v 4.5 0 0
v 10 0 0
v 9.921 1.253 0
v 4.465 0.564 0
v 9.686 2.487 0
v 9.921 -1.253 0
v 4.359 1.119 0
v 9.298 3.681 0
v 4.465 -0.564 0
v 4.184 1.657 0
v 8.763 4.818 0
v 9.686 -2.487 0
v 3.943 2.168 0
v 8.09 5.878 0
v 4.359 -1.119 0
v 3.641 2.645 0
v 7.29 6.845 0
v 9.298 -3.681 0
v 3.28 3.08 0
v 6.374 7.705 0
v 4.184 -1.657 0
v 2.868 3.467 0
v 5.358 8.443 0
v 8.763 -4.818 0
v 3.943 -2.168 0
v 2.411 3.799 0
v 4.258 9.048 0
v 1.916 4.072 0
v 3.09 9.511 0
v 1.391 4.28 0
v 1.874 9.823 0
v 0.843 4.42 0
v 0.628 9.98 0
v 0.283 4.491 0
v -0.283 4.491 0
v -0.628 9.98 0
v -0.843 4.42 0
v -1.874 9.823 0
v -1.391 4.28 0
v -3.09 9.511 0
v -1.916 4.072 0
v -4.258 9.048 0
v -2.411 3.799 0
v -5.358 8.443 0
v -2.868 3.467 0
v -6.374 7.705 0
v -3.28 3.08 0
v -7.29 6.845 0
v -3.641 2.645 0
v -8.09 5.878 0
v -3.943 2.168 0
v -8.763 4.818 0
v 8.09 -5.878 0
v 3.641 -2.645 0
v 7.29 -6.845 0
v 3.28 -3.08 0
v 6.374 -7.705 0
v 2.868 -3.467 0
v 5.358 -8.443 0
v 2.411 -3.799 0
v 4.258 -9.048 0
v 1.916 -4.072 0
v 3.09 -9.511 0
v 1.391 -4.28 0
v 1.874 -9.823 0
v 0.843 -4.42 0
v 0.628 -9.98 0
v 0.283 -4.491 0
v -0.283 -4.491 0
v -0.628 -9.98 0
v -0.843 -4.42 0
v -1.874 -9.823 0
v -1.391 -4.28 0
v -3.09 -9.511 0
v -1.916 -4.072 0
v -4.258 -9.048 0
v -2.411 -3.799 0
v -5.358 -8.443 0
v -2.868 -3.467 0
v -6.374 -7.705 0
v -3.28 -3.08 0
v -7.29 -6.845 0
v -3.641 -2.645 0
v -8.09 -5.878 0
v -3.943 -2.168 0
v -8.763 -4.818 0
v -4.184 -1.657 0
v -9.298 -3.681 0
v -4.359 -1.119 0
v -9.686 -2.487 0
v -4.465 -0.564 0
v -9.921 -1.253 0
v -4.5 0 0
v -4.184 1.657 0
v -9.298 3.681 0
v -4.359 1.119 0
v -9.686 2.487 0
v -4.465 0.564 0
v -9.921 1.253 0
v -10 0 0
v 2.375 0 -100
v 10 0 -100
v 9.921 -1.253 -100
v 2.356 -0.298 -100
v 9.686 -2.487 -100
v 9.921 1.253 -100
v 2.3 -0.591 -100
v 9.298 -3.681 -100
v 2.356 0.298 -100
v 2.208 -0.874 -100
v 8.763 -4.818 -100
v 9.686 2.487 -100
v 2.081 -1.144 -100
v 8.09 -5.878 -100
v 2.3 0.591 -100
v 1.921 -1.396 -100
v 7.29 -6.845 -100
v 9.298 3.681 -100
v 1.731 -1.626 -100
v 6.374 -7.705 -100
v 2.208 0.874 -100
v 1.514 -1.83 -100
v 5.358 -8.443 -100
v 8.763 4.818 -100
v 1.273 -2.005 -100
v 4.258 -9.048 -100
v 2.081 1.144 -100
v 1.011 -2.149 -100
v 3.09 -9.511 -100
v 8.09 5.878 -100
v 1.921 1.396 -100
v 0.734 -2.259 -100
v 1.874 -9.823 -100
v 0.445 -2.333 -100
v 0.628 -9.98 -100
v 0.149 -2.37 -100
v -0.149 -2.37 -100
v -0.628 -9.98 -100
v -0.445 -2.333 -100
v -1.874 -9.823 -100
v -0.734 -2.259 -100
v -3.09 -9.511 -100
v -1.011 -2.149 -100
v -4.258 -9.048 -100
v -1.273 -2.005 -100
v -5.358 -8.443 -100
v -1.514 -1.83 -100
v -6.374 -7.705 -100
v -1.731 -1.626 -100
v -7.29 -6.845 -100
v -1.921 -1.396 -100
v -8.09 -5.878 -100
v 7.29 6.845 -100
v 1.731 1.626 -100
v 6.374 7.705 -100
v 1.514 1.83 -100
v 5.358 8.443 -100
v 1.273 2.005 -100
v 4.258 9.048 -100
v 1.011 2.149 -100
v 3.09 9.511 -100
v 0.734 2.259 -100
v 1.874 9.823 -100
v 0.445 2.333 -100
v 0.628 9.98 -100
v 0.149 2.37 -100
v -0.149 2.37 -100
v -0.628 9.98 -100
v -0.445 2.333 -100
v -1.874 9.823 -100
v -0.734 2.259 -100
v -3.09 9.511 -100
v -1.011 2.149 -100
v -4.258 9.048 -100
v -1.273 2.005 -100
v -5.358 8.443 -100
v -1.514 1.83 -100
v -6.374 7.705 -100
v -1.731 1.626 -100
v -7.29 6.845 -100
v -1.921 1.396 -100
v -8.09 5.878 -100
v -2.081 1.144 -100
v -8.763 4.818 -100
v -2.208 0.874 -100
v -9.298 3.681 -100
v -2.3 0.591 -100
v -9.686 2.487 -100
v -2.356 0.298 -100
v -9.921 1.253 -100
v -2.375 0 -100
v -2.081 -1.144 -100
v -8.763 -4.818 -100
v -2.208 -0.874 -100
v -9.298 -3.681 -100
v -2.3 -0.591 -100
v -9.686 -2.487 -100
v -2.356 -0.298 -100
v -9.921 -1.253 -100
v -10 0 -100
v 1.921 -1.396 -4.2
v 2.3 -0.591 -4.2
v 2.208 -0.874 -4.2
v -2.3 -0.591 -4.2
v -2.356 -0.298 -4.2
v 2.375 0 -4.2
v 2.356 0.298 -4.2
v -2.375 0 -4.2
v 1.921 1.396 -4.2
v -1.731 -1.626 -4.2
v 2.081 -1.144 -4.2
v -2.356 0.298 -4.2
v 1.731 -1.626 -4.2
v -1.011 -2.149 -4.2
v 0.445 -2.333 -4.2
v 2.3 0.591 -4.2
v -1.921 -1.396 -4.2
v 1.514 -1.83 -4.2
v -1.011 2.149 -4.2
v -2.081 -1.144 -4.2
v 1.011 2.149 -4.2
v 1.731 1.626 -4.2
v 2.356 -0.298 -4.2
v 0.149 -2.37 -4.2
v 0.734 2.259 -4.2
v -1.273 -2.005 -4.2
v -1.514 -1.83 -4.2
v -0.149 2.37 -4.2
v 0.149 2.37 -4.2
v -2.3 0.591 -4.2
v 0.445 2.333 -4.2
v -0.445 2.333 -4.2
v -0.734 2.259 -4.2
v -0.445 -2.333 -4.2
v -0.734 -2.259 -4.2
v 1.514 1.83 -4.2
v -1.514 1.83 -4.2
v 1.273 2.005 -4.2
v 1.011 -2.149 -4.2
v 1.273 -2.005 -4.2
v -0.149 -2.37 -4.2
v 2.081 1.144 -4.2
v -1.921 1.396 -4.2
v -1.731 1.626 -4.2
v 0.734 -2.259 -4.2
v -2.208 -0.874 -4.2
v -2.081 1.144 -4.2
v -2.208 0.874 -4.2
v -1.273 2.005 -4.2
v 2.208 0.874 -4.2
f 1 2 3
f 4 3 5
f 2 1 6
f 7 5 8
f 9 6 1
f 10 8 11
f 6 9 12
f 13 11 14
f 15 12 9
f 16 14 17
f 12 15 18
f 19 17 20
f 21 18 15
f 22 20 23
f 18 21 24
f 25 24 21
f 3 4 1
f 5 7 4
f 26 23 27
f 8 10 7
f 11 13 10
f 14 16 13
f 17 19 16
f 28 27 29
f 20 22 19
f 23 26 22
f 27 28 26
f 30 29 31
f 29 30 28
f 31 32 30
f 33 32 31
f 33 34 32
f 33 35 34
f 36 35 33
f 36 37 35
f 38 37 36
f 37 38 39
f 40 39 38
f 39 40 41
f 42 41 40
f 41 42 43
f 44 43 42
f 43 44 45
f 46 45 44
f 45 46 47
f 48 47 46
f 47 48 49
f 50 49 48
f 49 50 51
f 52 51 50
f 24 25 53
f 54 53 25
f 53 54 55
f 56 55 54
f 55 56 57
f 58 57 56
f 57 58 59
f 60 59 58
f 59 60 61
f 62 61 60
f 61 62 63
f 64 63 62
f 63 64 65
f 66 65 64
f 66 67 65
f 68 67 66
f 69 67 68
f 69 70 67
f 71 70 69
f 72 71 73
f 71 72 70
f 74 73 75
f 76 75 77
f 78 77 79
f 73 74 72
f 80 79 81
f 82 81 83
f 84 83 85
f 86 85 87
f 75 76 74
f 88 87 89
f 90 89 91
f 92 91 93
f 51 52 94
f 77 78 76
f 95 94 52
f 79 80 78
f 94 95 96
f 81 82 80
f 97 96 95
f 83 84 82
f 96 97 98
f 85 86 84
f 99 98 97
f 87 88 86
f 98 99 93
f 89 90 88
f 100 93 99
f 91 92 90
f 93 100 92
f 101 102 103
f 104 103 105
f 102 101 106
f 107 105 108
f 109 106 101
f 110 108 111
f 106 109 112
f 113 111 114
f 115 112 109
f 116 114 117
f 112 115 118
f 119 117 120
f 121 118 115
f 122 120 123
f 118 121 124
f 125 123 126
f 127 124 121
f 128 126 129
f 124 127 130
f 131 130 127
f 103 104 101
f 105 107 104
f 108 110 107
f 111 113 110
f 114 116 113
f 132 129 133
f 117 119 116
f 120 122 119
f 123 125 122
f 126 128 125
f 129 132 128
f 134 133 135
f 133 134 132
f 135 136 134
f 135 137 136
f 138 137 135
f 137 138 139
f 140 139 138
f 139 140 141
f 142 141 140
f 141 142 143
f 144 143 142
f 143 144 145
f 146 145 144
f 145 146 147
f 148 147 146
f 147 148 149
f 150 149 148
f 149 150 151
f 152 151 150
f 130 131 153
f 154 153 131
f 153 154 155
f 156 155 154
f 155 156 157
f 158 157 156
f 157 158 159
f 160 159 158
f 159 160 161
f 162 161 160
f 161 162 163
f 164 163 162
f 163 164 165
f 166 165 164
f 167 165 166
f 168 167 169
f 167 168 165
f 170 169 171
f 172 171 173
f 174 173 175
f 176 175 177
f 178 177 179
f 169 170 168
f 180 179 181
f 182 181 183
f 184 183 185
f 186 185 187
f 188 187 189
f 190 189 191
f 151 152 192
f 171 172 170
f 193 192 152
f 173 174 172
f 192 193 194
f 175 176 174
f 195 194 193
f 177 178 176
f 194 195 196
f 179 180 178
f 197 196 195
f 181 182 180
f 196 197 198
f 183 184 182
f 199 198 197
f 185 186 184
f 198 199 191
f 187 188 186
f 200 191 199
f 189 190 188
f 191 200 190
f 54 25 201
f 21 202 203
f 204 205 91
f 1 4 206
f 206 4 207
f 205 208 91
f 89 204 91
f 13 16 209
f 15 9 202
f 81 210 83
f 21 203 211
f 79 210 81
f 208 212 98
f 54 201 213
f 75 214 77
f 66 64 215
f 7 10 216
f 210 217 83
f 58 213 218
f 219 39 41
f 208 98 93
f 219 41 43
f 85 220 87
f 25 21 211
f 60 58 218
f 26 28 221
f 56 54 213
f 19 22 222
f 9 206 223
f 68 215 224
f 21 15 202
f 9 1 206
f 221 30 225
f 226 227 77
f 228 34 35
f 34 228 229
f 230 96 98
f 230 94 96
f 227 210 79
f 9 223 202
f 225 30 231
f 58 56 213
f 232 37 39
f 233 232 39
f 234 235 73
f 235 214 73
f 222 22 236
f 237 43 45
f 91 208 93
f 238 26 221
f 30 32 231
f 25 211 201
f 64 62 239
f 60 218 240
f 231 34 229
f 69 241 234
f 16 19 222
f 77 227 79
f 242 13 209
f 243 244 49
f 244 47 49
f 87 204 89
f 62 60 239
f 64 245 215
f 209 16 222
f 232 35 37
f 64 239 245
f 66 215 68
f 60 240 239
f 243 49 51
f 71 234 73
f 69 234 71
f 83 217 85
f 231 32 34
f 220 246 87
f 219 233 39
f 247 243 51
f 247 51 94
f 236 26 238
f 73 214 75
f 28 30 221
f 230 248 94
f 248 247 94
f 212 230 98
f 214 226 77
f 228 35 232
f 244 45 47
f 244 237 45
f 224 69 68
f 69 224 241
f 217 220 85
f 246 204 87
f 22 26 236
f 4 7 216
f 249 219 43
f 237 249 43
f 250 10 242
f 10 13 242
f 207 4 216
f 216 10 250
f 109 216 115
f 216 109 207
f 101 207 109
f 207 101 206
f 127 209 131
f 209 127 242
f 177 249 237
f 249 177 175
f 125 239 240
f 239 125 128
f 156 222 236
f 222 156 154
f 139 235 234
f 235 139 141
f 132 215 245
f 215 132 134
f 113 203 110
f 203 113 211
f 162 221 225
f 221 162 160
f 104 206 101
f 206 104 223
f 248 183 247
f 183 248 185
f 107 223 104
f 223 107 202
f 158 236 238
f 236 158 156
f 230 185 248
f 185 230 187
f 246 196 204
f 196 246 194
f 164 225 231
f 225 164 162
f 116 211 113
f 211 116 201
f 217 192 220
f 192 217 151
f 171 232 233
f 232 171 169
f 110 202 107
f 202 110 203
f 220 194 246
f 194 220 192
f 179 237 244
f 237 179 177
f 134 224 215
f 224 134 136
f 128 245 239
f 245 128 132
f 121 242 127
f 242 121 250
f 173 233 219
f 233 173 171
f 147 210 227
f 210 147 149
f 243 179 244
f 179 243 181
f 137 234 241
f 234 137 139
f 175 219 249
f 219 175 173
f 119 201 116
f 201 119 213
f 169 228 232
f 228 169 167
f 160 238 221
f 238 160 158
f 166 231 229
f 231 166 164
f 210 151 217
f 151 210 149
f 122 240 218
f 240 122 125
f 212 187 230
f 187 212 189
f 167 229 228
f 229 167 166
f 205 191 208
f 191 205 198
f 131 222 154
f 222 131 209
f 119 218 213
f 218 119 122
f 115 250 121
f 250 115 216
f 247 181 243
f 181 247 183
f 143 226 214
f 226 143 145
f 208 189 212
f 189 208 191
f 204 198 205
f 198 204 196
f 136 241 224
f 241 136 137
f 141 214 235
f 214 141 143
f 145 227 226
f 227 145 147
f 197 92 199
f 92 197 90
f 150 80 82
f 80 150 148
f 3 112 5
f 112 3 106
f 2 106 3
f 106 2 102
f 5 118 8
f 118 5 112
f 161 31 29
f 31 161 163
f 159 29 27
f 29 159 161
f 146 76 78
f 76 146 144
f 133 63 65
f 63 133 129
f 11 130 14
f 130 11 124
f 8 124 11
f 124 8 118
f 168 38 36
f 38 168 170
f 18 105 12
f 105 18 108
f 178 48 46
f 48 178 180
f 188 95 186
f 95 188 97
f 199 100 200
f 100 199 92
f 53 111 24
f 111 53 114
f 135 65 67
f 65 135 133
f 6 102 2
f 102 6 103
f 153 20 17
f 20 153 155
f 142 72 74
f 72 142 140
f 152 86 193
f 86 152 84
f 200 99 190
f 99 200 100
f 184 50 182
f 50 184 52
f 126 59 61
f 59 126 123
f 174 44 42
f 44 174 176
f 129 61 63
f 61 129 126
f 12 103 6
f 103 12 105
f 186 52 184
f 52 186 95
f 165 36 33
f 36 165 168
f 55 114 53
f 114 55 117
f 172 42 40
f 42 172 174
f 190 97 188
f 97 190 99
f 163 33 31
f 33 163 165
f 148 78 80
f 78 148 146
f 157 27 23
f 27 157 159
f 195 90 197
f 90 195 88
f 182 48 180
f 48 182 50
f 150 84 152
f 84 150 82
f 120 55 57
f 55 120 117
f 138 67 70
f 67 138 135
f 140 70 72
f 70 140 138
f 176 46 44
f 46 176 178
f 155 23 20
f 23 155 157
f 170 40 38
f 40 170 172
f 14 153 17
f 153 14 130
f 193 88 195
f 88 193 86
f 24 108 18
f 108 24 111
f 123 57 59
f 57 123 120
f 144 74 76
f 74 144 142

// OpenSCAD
$fn = 50;


difference() {
	union() {
		translate(v = [0, 0, -100.0000000000]) {
			cylinder(h = 100, r = 10.0000000000);
		}
	}
	union() {
		translate(v = [0, 0, 0]) {
			rotate(a = [0, 0, 0]) {
				difference() {
					union() {
						#translate(v = [0, 0, -100.0000000000]) {
							cylinder(h = 100, r = 2.2500000000);
						}
						#translate(v = [0, 0, -4.2000000000]) {
							cylinder(h = 4.2000000000, r = 10.0000000000, r1 = 2.3750000000, r2 = 4.5000000000);
						}
						#translate(v = [0, 0, -100.0000000000]) {
							cylinder(h = 100, r = 2.3750000000);
						}
						#translate(v = [0, 0, -100.0000000000]) {
							cylinder(h = 100, r = 2.2500000000);
						}
					}
					union();
				}
			}
		}
	}
}
